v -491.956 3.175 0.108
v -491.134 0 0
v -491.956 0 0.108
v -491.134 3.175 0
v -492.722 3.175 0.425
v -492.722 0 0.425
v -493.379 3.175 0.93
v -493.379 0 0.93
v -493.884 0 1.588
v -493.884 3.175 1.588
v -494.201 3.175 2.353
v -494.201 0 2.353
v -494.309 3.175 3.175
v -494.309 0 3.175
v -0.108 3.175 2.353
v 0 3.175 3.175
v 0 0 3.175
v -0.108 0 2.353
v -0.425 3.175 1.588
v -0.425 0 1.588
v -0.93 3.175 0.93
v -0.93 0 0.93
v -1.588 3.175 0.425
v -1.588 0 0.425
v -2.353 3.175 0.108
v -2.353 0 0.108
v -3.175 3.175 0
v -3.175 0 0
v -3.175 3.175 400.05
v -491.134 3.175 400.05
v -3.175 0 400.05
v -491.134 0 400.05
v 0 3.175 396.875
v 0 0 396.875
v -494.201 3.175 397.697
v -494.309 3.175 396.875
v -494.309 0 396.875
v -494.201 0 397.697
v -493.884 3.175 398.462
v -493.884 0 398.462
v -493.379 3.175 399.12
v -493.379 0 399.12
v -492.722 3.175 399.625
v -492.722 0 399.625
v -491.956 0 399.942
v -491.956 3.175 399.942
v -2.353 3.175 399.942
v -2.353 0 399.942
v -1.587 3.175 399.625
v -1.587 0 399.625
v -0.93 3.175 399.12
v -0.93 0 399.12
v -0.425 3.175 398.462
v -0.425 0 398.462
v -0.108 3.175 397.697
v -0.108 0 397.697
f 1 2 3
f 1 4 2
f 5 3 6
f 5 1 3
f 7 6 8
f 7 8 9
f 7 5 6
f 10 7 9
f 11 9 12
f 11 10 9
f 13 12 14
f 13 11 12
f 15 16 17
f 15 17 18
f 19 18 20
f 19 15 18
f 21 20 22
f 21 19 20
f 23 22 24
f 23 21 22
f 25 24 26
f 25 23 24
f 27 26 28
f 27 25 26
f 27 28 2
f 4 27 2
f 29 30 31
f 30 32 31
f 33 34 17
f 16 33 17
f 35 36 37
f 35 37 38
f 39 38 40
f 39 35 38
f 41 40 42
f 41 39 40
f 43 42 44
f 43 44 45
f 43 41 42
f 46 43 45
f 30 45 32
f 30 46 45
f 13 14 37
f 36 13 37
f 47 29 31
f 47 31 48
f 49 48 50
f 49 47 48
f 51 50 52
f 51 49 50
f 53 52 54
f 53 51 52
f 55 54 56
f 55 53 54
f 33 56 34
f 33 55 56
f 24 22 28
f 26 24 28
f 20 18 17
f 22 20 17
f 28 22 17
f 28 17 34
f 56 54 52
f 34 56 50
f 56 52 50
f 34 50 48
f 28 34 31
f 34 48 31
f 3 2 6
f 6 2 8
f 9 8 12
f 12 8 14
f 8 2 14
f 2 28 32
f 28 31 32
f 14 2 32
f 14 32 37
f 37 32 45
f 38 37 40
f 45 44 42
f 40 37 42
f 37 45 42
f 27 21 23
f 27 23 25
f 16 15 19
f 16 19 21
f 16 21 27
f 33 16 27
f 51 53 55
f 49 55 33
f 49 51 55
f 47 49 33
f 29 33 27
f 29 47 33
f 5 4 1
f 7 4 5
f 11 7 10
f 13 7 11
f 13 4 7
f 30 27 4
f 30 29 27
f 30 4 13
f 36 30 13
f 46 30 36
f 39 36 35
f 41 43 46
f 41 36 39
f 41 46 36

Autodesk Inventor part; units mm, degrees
ref_plane "YZ Plane" through (0, 0, 0) normal (1, 0, 0) x (0, 1, 0)
ref_plane "XZ Plane" through (0, 0, 0) normal (0, 1, 0) x (-1, 0, 0)
ref_plane "XY Plane" through (0, 0, 0) normal (0, 0, 1) x (1, 0, 0)
sketch "Sketch1" plane through (0, 0, 0) normal (0, 1, 0) x (-1, 0, 0)
  line L0 (494.3094, 400.05) -> (0, 400.05)
  line L1 (0, 400.05) -> (0, 0)
  line L2 (0, 0) -> (494.3094, 0)
  line L3 (494.3094, 0) -> (494.3094, 400.05)
extrude "Extrusion1" add sketch "Sketch1" along normal blind 3.175
fillet "Fillet1" radius 3.175 1 edges at (0, 1.5875, 400.05)
fillet "Fillet2" radius 3.175 1 edges at (0, 1.5875, 0)
fillet "Fillet3" radius 3.175 1 edges at (-494.3094, 1.5875, 0)
fillet "Fillet4" radius 3.175 1 edges at (-494.3094, 1.5875, 400.05)
properties part number "liftingMechanismPlate"
